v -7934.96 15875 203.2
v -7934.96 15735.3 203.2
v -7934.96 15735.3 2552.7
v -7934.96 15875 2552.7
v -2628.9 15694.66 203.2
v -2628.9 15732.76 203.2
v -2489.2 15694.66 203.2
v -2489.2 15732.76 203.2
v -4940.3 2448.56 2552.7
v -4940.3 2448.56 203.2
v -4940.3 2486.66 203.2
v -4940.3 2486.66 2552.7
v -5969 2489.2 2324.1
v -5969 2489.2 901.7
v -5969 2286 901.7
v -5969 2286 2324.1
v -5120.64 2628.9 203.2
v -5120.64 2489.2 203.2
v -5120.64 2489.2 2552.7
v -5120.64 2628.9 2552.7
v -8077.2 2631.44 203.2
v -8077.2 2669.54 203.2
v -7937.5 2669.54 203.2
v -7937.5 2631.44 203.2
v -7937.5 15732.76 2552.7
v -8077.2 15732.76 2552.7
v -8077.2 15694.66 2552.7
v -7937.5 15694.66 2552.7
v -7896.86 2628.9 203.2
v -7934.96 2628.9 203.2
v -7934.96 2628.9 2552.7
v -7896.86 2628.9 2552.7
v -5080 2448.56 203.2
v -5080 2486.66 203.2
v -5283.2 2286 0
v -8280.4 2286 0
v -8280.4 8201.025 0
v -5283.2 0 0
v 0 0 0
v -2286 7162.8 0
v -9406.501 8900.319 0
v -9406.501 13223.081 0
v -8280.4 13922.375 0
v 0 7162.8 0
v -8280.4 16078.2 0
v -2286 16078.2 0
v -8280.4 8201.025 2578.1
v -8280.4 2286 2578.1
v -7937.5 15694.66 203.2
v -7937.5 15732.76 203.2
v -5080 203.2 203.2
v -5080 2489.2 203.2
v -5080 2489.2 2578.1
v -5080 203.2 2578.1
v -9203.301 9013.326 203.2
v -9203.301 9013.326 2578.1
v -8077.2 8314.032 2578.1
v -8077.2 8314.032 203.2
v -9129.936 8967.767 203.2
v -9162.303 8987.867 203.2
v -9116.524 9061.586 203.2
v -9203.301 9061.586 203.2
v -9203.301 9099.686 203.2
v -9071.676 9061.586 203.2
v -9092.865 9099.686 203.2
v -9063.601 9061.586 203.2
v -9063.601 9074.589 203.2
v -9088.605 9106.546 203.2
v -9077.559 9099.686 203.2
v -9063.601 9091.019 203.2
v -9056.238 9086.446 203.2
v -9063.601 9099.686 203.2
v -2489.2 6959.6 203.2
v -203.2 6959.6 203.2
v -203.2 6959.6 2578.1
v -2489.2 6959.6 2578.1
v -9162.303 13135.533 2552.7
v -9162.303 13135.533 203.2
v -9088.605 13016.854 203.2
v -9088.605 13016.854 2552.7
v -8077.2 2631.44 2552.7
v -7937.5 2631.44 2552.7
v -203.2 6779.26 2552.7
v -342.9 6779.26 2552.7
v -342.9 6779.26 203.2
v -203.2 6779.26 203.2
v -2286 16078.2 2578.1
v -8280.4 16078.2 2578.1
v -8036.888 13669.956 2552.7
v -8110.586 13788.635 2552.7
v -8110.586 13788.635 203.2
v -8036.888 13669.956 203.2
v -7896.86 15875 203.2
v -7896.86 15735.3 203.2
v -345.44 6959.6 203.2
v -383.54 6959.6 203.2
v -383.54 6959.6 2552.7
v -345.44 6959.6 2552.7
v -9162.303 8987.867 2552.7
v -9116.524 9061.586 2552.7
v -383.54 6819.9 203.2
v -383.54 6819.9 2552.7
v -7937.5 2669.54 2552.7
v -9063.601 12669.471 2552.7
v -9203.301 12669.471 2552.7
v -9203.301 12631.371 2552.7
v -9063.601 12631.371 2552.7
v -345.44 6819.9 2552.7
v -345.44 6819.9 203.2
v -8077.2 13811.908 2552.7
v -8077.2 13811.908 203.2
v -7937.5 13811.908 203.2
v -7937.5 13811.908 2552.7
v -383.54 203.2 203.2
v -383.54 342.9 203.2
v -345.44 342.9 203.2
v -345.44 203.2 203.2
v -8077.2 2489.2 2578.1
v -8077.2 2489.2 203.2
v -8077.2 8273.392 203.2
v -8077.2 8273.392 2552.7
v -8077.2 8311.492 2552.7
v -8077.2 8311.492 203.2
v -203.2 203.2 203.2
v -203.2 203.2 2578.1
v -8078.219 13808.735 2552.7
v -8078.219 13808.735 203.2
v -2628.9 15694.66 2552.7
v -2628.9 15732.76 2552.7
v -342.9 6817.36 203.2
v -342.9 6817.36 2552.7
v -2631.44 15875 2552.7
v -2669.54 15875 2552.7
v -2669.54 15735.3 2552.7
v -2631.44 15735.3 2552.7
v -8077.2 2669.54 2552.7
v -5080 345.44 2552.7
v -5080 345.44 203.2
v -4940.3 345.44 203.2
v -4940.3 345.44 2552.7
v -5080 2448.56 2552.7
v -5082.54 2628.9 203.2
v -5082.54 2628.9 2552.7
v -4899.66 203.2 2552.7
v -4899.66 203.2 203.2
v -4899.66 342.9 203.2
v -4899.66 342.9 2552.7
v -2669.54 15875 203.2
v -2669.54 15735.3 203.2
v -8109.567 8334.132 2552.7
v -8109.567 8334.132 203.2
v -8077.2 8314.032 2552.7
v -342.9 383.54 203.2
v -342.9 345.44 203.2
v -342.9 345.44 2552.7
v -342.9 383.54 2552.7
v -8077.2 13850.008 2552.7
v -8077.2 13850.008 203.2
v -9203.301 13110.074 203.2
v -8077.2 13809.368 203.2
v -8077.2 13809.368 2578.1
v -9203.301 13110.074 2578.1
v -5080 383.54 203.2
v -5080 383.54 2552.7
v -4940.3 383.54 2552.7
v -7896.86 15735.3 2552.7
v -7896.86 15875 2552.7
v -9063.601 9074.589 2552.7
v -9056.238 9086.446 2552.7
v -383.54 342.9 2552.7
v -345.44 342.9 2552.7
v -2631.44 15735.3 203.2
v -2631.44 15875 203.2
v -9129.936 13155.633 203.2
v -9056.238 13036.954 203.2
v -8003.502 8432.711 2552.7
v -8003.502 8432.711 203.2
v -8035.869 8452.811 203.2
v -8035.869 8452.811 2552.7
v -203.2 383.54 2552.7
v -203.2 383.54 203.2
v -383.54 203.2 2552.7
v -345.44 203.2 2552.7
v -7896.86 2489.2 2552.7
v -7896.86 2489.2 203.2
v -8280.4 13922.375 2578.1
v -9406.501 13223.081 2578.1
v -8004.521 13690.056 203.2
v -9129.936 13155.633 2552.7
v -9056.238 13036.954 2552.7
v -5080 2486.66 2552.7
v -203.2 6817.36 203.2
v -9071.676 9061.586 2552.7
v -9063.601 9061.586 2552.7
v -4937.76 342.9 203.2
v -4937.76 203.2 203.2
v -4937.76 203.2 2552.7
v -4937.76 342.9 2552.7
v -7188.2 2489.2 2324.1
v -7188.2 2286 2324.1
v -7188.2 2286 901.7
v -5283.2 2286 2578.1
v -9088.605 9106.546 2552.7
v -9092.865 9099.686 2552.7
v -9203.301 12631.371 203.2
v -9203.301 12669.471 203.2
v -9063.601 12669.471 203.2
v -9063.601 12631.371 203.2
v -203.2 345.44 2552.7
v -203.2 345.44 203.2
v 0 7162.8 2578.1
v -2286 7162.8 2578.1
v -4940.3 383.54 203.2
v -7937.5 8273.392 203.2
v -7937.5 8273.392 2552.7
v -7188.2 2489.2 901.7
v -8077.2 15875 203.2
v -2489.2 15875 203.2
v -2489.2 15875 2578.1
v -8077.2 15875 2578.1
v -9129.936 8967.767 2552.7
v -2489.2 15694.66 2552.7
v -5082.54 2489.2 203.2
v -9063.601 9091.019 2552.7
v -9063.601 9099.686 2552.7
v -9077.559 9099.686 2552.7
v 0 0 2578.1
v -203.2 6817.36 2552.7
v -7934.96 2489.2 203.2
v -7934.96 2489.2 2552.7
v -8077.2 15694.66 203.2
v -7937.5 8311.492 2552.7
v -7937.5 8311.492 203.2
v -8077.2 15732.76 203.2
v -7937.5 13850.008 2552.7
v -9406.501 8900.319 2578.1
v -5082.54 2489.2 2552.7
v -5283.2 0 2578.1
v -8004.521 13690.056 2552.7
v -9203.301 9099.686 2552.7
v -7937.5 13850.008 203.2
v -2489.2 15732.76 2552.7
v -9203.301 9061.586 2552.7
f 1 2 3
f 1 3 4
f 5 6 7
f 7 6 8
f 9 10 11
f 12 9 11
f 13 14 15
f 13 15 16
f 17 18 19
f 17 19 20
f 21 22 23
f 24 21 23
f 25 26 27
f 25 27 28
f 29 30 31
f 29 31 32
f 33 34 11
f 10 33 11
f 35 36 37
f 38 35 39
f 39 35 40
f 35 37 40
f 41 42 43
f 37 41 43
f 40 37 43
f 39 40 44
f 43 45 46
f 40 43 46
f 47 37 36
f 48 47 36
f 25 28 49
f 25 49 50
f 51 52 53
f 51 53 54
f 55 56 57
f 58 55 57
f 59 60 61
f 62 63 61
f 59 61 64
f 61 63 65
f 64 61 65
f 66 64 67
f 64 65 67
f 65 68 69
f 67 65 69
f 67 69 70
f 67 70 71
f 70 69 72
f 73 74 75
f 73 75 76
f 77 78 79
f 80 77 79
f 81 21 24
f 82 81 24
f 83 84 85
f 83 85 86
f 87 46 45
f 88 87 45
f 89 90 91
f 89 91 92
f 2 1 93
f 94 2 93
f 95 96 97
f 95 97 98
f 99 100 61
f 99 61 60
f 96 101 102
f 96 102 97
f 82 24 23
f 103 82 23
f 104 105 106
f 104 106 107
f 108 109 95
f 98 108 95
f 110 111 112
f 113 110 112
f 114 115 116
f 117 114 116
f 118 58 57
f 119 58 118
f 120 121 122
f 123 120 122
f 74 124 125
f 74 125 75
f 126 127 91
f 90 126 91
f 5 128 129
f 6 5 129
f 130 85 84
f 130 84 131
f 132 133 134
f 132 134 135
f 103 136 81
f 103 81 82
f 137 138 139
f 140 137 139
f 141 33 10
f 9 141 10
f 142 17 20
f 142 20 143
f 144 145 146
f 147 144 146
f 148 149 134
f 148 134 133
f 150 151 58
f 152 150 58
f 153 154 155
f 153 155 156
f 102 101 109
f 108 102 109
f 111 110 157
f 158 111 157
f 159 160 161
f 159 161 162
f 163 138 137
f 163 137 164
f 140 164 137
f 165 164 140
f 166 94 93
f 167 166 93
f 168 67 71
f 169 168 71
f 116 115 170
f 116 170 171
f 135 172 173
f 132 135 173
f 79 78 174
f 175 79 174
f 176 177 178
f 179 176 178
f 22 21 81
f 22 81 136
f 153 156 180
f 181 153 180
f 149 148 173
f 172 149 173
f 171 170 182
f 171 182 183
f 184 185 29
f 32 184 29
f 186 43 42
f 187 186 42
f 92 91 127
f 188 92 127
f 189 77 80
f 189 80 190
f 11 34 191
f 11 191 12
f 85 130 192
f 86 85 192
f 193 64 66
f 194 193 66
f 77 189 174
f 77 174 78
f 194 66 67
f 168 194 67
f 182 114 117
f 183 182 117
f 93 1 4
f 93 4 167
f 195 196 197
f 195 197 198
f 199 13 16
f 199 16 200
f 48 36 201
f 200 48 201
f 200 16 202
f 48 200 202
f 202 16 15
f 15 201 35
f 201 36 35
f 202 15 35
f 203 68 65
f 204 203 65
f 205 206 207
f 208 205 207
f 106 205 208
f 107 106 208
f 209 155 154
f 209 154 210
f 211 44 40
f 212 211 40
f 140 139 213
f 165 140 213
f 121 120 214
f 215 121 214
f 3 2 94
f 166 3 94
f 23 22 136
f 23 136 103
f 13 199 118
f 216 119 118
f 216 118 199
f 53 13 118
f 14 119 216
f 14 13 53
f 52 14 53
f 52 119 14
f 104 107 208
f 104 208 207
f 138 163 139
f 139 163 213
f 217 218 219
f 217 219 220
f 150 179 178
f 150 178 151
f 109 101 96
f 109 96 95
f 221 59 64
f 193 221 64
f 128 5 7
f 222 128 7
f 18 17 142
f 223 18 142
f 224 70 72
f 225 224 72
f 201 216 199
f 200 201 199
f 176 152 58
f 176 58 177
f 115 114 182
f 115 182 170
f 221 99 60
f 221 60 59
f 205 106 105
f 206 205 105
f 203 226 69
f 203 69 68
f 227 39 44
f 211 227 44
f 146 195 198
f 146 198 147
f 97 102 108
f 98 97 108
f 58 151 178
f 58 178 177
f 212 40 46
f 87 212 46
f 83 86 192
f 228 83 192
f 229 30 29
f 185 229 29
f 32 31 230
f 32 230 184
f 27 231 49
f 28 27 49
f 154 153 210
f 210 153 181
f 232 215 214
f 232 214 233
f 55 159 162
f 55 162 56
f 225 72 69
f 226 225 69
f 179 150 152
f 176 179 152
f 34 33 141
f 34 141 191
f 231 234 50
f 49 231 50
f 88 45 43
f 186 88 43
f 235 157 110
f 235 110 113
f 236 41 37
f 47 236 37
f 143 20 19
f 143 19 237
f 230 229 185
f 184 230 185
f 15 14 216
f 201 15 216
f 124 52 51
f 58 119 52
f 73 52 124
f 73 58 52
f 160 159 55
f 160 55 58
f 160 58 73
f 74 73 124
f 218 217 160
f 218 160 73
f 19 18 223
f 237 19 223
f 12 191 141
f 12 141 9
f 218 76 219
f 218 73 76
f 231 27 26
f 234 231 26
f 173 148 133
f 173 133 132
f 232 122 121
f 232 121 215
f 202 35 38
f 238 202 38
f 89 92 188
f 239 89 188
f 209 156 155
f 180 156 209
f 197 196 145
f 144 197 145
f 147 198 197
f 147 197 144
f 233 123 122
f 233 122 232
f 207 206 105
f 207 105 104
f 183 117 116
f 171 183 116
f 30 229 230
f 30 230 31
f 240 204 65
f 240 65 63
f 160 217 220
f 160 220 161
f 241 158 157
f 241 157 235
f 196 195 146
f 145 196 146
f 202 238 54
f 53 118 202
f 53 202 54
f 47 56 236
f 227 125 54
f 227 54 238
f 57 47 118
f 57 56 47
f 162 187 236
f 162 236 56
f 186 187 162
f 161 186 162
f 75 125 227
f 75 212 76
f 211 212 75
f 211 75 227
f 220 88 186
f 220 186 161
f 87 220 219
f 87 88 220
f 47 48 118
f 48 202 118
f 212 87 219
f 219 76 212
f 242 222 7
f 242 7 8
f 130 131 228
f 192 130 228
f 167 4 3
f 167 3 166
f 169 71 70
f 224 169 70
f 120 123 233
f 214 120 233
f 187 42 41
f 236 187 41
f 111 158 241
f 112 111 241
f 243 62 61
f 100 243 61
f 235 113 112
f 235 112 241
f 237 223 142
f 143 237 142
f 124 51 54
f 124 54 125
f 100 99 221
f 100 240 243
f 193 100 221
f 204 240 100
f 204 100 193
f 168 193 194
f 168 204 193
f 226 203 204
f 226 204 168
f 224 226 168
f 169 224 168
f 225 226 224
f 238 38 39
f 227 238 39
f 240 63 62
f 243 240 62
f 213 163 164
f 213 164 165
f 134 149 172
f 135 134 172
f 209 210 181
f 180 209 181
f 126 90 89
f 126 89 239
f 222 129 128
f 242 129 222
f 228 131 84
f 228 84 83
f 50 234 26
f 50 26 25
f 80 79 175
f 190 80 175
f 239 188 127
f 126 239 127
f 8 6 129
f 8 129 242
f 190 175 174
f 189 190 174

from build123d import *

# Parameters (mm, degrees)
F1_DEPTH = 2578.1
F2_T     = -203.2
F3_W     = 1219.2
F3_H     = 1422.4
F5_DEPTH = 203.2
F4_W     = 139.7
F4_H     = 38.1
F6_DEPTH = 2349.5
F4_W_2   = 38.1
F4_H_2   = 139.7


# Not quite as in the source:
# - a feature of the source that left no trace in its solid (it failed there, or was rolled back) is left out


with BuildPart() as f1:
    # F0 (on Top) → F1 (new body)
    with BuildSketch(Plane.XY):
        Polygon((-2286, 16078.2), (-8280.4, 16078.2), (-8280.4, 13922.375), (-9406.501324312, 13223.08125), (-9406.501324312, 8900.31875), (-8280.4, 8201.025), (-8280.4, 2286), (-5283.2, 2286), (-5283.2, 0), (0, 0), (0, 7162.8), (-2286, 7162.8), align=None)
    extrude(amount=F1_DEPTH)

    # F2
    f2_openings = [f1.faces().sort_by_distance(p)[0] for p in [
        (-4762.628229, 7961.579676, 2578.1),
    ]]
    offset(amount=F2_T, openings=f2_openings, kind=Kind.INTERSECTION)

    # F3 (on face) → F5 (cut, through all)
    with BuildSketch(Plane(origin=(0, 2489.2, 0), x_dir=(-1, 0, 0), z_dir=(0, 1, 0))):
        with Locations((6578.6, 1612.9)):
            Rectangle(F3_W, F3_H)
    extrude(amount=-F5_DEPTH, mode=Mode.SUBTRACT)


with BuildPart() as f6:
    # F4 (on face) → F6 (new body)
    with BuildSketch(Plane.XY.offset(203.2)):
        with Locations((-8007.35, 13830.9575758433)):
            Rectangle(F4_W, F4_H)
    extrude(amount=F6_DEPTH)


with BuildPart() as f6b:
    # F4 (on face) → F6, piece 2 (new body)
    with BuildSketch(Plane.XY.offset(203.2)):
        with Locations((-7915.91, 15805.15)):
            Rectangle(F4_W_2, F4_H_2)
    extrude(amount=F6_DEPTH)


with BuildPart() as f6c:
    # F4 (on face) → F6, piece 3 (new body)
    with BuildSketch(Plane.XY.offset(203.2)):
        with Locations((-8007.35, 15713.71)):
            Rectangle(F4_W, F4_H)
    extrude(amount=F6_DEPTH)


with BuildPart() as f6d:
    # F4 (on face) → F6, piece 4 (new body)
    with BuildSketch(Plane.XY.offset(203.2)):
        with Locations((-2650.49, 15805.15)):
            Rectangle(F4_W_2, F4_H_2)
    extrude(amount=F6_DEPTH)


with BuildPart() as f6e:
    # F4 (on face) → F6, piece 5 (new body)
    with BuildSketch(Plane.XY.offset(203.2)):
        with Locations((-2559.05, 15713.71)):
            Rectangle(F4_W, F4_H)
    extrude(amount=F6_DEPTH)


with BuildPart() as f6f:
    # F4 (on face) → F6, piece 6 (new body)
    with BuildSketch(Plane.XY.offset(203.2)):
        Polygon((-8004.5214391422, 13690.0555610339), (-8078.2194630943, 13808.7345029973), (-8110.5864472661, 13788.6350419195), (-8036.888423314, 13669.9560999561), align=None)
    extrude(amount=F6_DEPTH)


with BuildPart() as f6g:
    # F4 (on face) → F6, piece 7 (new body)
    with BuildSketch(Plane.XY.offset(203.2)):
        with Locations((-9133.451324312, 12650.4205444336)):
            Rectangle(F4_W, F4_H)
    extrude(amount=F6_DEPTH)


with BuildPart() as f6h:
    # F4 (on face) → F6, piece 8 (new body)
    with BuildSketch(Plane.XY.offset(203.2)):
        Polygon((-9129.9361601891, 13155.6326042864), (-9162.303144361, 13135.5331432085), (-9088.6051204089, 13016.8542012451), (-9056.238136237, 13036.9536623229), align=None)
    extrude(amount=F6_DEPTH)


with BuildPart() as f6i:
    # F4 (on face) → F6, piece 9 (new body)
    with BuildSketch(Plane.XY.offset(203.2)):
        Polygon((-9116.524441526, 9061.5861741567), (-9162.303144361, 8987.8668567915), (-9129.9361601891, 8967.7673957136), (-9071.6759628326, 9061.5861741567), align=None)
        Polygon((-9203.301324312, 9061.5861741567), (-9116.524441526, 9061.5861741567), (-9092.864854862, 9099.6861741567), (-9203.301324312, 9099.6861741567), align=None)
        Polygon((-9092.864854862, 9099.6861741567), (-9116.524441526, 9061.5861741567), (-9071.6759628326, 9061.5861741567), (-9063.601324312, 9074.5890947912), (-9063.601324312, 9091.0187782645), (-9077.5587863837, 9099.6861741567), align=None)
        Polygon((-9088.6051204089, 9106.5457987549), (-9092.864854862, 9099.6861741567), (-9077.5587863837, 9099.6861741567), align=None)
        Polygon((-9063.601324312, 9074.5890947912), (-9071.6759628326, 9061.5861741567), (-9063.601324312, 9061.5861741567), align=None)
        Polygon((-9063.601324312, 9099.6861741567), (-9077.5587863837, 9099.6861741567), (-9063.601324312, 9091.0187782645), align=None)
        Polygon((-9063.601324312, 9091.0187782645), (-9063.601324312, 9074.5890947912), (-9056.238136237, 9086.446337677), align=None)
    extrude(amount=F6_DEPTH)


with BuildPart() as f6j:
    # F4 (on face) → F6, piece 10 (new body)
    with BuildSketch(Plane.XY.offset(203.2)):
        Polygon((-8035.8689602197, 8452.810827198), (-8109.5669841718, 8334.1318852346), (-8077.2, 8314.0324241568), (-8003.5019760479, 8432.7113661202), align=None)
    extrude(amount=F6_DEPTH)


with BuildPart() as f6k:
    # F4 (on face) → F6, piece 11 (new body)
    with BuildSketch(Plane.XY.offset(203.2)):
        with Locations((-8007.35, 8292.4424241568)):
            Rectangle(F4_W, F4_H)
    extrude(amount=F6_DEPTH)


with BuildPart() as f6l:
    # F4 (on face) → F6, piece 12 (new body)
    with BuildSketch(Plane.XY.offset(203.2)):
        with Locations((-8007.35, 2650.49)):
            Rectangle(F4_W, F4_H)
    extrude(amount=F6_DEPTH)


with BuildPart() as f6m:
    # F4 (on face) → F6, piece 13 (new body)
    with BuildSketch(Plane.XY.offset(203.2)):
        with Locations((-7915.91, 2559.05)):
            Rectangle(F4_W_2, F4_H_2)
    extrude(amount=F6_DEPTH)


with BuildPart() as f6n:
    # F4 (on face) → F6, piece 14 (new body)
    with BuildSketch(Plane.XY.offset(203.2)):
        with Locations((-5101.59, 2559.05)):
            Rectangle(F4_W_2, F4_H_2)
    extrude(amount=F6_DEPTH)


with BuildPart() as f6o:
    # F4 (on face) → F6, piece 15 (new body)
    with BuildSketch(Plane.XY.offset(203.2)):
        with Locations((-5010.15, 2467.61)):
            Rectangle(F4_W, F4_H)
    extrude(amount=F6_DEPTH)


with BuildPart() as f6p:
    # F4 (on face) → F6, piece 16 (new body)
    with BuildSketch(Plane.XY.offset(203.2)):
        with Locations((-5010.15, 364.49)):
            Rectangle(F4_W, F4_H)
    extrude(amount=F6_DEPTH)


with BuildPart() as f6q:
    # F4 (on face) → F6, piece 17 (new body)
    with BuildSketch(Plane.XY.offset(203.2)):
        with Locations((-4918.71, 273.05)):
            Rectangle(F4_W_2, F4_H_2)
    extrude(amount=F6_DEPTH)


with BuildPart() as f6r:
    # F4 (on face) → F6, piece 18 (new body)
    with BuildSketch(Plane.XY.offset(203.2)):
        with Locations((-364.49, 273.05)):
            Rectangle(F4_W_2, F4_H_2)
    extrude(amount=F6_DEPTH)


with BuildPart() as f6s:
    # F4 (on face) → F6, piece 19 (new body)
    with BuildSketch(Plane.XY.offset(203.2)):
        with Locations((-273.05, 364.49)):
            Rectangle(F4_W, F4_H)
    extrude(amount=F6_DEPTH)


with BuildPart() as f6t:
    # F4 (on face) → F6, piece 20 (new body)
    with BuildSketch(Plane.XY.offset(203.2)):
        with Locations((-273.05, 6798.31)):
            Rectangle(F4_W, F4_H)
    extrude(amount=F6_DEPTH)


with BuildPart() as f6u:
    # F4 (on face) → F6, piece 21 (new body)
    with BuildSketch(Plane.XY.offset(203.2)):
        with Locations((-364.49, 6889.75)):
            Rectangle(F4_W_2, F4_H_2)
    extrude(amount=F6_DEPTH)


solid = Compound([f1.part, f6.part, f6b.part, f6c.part, f6d.part, f6e.part, f6f.part, f6g.part, f6h.part, f6i.part, f6j.part, f6k.part, f6l.part, f6m.part, f6n.part, f6o.part, f6p.part, f6q.part, f6r.part, f6s.part, f6t.part, f6u.part])
